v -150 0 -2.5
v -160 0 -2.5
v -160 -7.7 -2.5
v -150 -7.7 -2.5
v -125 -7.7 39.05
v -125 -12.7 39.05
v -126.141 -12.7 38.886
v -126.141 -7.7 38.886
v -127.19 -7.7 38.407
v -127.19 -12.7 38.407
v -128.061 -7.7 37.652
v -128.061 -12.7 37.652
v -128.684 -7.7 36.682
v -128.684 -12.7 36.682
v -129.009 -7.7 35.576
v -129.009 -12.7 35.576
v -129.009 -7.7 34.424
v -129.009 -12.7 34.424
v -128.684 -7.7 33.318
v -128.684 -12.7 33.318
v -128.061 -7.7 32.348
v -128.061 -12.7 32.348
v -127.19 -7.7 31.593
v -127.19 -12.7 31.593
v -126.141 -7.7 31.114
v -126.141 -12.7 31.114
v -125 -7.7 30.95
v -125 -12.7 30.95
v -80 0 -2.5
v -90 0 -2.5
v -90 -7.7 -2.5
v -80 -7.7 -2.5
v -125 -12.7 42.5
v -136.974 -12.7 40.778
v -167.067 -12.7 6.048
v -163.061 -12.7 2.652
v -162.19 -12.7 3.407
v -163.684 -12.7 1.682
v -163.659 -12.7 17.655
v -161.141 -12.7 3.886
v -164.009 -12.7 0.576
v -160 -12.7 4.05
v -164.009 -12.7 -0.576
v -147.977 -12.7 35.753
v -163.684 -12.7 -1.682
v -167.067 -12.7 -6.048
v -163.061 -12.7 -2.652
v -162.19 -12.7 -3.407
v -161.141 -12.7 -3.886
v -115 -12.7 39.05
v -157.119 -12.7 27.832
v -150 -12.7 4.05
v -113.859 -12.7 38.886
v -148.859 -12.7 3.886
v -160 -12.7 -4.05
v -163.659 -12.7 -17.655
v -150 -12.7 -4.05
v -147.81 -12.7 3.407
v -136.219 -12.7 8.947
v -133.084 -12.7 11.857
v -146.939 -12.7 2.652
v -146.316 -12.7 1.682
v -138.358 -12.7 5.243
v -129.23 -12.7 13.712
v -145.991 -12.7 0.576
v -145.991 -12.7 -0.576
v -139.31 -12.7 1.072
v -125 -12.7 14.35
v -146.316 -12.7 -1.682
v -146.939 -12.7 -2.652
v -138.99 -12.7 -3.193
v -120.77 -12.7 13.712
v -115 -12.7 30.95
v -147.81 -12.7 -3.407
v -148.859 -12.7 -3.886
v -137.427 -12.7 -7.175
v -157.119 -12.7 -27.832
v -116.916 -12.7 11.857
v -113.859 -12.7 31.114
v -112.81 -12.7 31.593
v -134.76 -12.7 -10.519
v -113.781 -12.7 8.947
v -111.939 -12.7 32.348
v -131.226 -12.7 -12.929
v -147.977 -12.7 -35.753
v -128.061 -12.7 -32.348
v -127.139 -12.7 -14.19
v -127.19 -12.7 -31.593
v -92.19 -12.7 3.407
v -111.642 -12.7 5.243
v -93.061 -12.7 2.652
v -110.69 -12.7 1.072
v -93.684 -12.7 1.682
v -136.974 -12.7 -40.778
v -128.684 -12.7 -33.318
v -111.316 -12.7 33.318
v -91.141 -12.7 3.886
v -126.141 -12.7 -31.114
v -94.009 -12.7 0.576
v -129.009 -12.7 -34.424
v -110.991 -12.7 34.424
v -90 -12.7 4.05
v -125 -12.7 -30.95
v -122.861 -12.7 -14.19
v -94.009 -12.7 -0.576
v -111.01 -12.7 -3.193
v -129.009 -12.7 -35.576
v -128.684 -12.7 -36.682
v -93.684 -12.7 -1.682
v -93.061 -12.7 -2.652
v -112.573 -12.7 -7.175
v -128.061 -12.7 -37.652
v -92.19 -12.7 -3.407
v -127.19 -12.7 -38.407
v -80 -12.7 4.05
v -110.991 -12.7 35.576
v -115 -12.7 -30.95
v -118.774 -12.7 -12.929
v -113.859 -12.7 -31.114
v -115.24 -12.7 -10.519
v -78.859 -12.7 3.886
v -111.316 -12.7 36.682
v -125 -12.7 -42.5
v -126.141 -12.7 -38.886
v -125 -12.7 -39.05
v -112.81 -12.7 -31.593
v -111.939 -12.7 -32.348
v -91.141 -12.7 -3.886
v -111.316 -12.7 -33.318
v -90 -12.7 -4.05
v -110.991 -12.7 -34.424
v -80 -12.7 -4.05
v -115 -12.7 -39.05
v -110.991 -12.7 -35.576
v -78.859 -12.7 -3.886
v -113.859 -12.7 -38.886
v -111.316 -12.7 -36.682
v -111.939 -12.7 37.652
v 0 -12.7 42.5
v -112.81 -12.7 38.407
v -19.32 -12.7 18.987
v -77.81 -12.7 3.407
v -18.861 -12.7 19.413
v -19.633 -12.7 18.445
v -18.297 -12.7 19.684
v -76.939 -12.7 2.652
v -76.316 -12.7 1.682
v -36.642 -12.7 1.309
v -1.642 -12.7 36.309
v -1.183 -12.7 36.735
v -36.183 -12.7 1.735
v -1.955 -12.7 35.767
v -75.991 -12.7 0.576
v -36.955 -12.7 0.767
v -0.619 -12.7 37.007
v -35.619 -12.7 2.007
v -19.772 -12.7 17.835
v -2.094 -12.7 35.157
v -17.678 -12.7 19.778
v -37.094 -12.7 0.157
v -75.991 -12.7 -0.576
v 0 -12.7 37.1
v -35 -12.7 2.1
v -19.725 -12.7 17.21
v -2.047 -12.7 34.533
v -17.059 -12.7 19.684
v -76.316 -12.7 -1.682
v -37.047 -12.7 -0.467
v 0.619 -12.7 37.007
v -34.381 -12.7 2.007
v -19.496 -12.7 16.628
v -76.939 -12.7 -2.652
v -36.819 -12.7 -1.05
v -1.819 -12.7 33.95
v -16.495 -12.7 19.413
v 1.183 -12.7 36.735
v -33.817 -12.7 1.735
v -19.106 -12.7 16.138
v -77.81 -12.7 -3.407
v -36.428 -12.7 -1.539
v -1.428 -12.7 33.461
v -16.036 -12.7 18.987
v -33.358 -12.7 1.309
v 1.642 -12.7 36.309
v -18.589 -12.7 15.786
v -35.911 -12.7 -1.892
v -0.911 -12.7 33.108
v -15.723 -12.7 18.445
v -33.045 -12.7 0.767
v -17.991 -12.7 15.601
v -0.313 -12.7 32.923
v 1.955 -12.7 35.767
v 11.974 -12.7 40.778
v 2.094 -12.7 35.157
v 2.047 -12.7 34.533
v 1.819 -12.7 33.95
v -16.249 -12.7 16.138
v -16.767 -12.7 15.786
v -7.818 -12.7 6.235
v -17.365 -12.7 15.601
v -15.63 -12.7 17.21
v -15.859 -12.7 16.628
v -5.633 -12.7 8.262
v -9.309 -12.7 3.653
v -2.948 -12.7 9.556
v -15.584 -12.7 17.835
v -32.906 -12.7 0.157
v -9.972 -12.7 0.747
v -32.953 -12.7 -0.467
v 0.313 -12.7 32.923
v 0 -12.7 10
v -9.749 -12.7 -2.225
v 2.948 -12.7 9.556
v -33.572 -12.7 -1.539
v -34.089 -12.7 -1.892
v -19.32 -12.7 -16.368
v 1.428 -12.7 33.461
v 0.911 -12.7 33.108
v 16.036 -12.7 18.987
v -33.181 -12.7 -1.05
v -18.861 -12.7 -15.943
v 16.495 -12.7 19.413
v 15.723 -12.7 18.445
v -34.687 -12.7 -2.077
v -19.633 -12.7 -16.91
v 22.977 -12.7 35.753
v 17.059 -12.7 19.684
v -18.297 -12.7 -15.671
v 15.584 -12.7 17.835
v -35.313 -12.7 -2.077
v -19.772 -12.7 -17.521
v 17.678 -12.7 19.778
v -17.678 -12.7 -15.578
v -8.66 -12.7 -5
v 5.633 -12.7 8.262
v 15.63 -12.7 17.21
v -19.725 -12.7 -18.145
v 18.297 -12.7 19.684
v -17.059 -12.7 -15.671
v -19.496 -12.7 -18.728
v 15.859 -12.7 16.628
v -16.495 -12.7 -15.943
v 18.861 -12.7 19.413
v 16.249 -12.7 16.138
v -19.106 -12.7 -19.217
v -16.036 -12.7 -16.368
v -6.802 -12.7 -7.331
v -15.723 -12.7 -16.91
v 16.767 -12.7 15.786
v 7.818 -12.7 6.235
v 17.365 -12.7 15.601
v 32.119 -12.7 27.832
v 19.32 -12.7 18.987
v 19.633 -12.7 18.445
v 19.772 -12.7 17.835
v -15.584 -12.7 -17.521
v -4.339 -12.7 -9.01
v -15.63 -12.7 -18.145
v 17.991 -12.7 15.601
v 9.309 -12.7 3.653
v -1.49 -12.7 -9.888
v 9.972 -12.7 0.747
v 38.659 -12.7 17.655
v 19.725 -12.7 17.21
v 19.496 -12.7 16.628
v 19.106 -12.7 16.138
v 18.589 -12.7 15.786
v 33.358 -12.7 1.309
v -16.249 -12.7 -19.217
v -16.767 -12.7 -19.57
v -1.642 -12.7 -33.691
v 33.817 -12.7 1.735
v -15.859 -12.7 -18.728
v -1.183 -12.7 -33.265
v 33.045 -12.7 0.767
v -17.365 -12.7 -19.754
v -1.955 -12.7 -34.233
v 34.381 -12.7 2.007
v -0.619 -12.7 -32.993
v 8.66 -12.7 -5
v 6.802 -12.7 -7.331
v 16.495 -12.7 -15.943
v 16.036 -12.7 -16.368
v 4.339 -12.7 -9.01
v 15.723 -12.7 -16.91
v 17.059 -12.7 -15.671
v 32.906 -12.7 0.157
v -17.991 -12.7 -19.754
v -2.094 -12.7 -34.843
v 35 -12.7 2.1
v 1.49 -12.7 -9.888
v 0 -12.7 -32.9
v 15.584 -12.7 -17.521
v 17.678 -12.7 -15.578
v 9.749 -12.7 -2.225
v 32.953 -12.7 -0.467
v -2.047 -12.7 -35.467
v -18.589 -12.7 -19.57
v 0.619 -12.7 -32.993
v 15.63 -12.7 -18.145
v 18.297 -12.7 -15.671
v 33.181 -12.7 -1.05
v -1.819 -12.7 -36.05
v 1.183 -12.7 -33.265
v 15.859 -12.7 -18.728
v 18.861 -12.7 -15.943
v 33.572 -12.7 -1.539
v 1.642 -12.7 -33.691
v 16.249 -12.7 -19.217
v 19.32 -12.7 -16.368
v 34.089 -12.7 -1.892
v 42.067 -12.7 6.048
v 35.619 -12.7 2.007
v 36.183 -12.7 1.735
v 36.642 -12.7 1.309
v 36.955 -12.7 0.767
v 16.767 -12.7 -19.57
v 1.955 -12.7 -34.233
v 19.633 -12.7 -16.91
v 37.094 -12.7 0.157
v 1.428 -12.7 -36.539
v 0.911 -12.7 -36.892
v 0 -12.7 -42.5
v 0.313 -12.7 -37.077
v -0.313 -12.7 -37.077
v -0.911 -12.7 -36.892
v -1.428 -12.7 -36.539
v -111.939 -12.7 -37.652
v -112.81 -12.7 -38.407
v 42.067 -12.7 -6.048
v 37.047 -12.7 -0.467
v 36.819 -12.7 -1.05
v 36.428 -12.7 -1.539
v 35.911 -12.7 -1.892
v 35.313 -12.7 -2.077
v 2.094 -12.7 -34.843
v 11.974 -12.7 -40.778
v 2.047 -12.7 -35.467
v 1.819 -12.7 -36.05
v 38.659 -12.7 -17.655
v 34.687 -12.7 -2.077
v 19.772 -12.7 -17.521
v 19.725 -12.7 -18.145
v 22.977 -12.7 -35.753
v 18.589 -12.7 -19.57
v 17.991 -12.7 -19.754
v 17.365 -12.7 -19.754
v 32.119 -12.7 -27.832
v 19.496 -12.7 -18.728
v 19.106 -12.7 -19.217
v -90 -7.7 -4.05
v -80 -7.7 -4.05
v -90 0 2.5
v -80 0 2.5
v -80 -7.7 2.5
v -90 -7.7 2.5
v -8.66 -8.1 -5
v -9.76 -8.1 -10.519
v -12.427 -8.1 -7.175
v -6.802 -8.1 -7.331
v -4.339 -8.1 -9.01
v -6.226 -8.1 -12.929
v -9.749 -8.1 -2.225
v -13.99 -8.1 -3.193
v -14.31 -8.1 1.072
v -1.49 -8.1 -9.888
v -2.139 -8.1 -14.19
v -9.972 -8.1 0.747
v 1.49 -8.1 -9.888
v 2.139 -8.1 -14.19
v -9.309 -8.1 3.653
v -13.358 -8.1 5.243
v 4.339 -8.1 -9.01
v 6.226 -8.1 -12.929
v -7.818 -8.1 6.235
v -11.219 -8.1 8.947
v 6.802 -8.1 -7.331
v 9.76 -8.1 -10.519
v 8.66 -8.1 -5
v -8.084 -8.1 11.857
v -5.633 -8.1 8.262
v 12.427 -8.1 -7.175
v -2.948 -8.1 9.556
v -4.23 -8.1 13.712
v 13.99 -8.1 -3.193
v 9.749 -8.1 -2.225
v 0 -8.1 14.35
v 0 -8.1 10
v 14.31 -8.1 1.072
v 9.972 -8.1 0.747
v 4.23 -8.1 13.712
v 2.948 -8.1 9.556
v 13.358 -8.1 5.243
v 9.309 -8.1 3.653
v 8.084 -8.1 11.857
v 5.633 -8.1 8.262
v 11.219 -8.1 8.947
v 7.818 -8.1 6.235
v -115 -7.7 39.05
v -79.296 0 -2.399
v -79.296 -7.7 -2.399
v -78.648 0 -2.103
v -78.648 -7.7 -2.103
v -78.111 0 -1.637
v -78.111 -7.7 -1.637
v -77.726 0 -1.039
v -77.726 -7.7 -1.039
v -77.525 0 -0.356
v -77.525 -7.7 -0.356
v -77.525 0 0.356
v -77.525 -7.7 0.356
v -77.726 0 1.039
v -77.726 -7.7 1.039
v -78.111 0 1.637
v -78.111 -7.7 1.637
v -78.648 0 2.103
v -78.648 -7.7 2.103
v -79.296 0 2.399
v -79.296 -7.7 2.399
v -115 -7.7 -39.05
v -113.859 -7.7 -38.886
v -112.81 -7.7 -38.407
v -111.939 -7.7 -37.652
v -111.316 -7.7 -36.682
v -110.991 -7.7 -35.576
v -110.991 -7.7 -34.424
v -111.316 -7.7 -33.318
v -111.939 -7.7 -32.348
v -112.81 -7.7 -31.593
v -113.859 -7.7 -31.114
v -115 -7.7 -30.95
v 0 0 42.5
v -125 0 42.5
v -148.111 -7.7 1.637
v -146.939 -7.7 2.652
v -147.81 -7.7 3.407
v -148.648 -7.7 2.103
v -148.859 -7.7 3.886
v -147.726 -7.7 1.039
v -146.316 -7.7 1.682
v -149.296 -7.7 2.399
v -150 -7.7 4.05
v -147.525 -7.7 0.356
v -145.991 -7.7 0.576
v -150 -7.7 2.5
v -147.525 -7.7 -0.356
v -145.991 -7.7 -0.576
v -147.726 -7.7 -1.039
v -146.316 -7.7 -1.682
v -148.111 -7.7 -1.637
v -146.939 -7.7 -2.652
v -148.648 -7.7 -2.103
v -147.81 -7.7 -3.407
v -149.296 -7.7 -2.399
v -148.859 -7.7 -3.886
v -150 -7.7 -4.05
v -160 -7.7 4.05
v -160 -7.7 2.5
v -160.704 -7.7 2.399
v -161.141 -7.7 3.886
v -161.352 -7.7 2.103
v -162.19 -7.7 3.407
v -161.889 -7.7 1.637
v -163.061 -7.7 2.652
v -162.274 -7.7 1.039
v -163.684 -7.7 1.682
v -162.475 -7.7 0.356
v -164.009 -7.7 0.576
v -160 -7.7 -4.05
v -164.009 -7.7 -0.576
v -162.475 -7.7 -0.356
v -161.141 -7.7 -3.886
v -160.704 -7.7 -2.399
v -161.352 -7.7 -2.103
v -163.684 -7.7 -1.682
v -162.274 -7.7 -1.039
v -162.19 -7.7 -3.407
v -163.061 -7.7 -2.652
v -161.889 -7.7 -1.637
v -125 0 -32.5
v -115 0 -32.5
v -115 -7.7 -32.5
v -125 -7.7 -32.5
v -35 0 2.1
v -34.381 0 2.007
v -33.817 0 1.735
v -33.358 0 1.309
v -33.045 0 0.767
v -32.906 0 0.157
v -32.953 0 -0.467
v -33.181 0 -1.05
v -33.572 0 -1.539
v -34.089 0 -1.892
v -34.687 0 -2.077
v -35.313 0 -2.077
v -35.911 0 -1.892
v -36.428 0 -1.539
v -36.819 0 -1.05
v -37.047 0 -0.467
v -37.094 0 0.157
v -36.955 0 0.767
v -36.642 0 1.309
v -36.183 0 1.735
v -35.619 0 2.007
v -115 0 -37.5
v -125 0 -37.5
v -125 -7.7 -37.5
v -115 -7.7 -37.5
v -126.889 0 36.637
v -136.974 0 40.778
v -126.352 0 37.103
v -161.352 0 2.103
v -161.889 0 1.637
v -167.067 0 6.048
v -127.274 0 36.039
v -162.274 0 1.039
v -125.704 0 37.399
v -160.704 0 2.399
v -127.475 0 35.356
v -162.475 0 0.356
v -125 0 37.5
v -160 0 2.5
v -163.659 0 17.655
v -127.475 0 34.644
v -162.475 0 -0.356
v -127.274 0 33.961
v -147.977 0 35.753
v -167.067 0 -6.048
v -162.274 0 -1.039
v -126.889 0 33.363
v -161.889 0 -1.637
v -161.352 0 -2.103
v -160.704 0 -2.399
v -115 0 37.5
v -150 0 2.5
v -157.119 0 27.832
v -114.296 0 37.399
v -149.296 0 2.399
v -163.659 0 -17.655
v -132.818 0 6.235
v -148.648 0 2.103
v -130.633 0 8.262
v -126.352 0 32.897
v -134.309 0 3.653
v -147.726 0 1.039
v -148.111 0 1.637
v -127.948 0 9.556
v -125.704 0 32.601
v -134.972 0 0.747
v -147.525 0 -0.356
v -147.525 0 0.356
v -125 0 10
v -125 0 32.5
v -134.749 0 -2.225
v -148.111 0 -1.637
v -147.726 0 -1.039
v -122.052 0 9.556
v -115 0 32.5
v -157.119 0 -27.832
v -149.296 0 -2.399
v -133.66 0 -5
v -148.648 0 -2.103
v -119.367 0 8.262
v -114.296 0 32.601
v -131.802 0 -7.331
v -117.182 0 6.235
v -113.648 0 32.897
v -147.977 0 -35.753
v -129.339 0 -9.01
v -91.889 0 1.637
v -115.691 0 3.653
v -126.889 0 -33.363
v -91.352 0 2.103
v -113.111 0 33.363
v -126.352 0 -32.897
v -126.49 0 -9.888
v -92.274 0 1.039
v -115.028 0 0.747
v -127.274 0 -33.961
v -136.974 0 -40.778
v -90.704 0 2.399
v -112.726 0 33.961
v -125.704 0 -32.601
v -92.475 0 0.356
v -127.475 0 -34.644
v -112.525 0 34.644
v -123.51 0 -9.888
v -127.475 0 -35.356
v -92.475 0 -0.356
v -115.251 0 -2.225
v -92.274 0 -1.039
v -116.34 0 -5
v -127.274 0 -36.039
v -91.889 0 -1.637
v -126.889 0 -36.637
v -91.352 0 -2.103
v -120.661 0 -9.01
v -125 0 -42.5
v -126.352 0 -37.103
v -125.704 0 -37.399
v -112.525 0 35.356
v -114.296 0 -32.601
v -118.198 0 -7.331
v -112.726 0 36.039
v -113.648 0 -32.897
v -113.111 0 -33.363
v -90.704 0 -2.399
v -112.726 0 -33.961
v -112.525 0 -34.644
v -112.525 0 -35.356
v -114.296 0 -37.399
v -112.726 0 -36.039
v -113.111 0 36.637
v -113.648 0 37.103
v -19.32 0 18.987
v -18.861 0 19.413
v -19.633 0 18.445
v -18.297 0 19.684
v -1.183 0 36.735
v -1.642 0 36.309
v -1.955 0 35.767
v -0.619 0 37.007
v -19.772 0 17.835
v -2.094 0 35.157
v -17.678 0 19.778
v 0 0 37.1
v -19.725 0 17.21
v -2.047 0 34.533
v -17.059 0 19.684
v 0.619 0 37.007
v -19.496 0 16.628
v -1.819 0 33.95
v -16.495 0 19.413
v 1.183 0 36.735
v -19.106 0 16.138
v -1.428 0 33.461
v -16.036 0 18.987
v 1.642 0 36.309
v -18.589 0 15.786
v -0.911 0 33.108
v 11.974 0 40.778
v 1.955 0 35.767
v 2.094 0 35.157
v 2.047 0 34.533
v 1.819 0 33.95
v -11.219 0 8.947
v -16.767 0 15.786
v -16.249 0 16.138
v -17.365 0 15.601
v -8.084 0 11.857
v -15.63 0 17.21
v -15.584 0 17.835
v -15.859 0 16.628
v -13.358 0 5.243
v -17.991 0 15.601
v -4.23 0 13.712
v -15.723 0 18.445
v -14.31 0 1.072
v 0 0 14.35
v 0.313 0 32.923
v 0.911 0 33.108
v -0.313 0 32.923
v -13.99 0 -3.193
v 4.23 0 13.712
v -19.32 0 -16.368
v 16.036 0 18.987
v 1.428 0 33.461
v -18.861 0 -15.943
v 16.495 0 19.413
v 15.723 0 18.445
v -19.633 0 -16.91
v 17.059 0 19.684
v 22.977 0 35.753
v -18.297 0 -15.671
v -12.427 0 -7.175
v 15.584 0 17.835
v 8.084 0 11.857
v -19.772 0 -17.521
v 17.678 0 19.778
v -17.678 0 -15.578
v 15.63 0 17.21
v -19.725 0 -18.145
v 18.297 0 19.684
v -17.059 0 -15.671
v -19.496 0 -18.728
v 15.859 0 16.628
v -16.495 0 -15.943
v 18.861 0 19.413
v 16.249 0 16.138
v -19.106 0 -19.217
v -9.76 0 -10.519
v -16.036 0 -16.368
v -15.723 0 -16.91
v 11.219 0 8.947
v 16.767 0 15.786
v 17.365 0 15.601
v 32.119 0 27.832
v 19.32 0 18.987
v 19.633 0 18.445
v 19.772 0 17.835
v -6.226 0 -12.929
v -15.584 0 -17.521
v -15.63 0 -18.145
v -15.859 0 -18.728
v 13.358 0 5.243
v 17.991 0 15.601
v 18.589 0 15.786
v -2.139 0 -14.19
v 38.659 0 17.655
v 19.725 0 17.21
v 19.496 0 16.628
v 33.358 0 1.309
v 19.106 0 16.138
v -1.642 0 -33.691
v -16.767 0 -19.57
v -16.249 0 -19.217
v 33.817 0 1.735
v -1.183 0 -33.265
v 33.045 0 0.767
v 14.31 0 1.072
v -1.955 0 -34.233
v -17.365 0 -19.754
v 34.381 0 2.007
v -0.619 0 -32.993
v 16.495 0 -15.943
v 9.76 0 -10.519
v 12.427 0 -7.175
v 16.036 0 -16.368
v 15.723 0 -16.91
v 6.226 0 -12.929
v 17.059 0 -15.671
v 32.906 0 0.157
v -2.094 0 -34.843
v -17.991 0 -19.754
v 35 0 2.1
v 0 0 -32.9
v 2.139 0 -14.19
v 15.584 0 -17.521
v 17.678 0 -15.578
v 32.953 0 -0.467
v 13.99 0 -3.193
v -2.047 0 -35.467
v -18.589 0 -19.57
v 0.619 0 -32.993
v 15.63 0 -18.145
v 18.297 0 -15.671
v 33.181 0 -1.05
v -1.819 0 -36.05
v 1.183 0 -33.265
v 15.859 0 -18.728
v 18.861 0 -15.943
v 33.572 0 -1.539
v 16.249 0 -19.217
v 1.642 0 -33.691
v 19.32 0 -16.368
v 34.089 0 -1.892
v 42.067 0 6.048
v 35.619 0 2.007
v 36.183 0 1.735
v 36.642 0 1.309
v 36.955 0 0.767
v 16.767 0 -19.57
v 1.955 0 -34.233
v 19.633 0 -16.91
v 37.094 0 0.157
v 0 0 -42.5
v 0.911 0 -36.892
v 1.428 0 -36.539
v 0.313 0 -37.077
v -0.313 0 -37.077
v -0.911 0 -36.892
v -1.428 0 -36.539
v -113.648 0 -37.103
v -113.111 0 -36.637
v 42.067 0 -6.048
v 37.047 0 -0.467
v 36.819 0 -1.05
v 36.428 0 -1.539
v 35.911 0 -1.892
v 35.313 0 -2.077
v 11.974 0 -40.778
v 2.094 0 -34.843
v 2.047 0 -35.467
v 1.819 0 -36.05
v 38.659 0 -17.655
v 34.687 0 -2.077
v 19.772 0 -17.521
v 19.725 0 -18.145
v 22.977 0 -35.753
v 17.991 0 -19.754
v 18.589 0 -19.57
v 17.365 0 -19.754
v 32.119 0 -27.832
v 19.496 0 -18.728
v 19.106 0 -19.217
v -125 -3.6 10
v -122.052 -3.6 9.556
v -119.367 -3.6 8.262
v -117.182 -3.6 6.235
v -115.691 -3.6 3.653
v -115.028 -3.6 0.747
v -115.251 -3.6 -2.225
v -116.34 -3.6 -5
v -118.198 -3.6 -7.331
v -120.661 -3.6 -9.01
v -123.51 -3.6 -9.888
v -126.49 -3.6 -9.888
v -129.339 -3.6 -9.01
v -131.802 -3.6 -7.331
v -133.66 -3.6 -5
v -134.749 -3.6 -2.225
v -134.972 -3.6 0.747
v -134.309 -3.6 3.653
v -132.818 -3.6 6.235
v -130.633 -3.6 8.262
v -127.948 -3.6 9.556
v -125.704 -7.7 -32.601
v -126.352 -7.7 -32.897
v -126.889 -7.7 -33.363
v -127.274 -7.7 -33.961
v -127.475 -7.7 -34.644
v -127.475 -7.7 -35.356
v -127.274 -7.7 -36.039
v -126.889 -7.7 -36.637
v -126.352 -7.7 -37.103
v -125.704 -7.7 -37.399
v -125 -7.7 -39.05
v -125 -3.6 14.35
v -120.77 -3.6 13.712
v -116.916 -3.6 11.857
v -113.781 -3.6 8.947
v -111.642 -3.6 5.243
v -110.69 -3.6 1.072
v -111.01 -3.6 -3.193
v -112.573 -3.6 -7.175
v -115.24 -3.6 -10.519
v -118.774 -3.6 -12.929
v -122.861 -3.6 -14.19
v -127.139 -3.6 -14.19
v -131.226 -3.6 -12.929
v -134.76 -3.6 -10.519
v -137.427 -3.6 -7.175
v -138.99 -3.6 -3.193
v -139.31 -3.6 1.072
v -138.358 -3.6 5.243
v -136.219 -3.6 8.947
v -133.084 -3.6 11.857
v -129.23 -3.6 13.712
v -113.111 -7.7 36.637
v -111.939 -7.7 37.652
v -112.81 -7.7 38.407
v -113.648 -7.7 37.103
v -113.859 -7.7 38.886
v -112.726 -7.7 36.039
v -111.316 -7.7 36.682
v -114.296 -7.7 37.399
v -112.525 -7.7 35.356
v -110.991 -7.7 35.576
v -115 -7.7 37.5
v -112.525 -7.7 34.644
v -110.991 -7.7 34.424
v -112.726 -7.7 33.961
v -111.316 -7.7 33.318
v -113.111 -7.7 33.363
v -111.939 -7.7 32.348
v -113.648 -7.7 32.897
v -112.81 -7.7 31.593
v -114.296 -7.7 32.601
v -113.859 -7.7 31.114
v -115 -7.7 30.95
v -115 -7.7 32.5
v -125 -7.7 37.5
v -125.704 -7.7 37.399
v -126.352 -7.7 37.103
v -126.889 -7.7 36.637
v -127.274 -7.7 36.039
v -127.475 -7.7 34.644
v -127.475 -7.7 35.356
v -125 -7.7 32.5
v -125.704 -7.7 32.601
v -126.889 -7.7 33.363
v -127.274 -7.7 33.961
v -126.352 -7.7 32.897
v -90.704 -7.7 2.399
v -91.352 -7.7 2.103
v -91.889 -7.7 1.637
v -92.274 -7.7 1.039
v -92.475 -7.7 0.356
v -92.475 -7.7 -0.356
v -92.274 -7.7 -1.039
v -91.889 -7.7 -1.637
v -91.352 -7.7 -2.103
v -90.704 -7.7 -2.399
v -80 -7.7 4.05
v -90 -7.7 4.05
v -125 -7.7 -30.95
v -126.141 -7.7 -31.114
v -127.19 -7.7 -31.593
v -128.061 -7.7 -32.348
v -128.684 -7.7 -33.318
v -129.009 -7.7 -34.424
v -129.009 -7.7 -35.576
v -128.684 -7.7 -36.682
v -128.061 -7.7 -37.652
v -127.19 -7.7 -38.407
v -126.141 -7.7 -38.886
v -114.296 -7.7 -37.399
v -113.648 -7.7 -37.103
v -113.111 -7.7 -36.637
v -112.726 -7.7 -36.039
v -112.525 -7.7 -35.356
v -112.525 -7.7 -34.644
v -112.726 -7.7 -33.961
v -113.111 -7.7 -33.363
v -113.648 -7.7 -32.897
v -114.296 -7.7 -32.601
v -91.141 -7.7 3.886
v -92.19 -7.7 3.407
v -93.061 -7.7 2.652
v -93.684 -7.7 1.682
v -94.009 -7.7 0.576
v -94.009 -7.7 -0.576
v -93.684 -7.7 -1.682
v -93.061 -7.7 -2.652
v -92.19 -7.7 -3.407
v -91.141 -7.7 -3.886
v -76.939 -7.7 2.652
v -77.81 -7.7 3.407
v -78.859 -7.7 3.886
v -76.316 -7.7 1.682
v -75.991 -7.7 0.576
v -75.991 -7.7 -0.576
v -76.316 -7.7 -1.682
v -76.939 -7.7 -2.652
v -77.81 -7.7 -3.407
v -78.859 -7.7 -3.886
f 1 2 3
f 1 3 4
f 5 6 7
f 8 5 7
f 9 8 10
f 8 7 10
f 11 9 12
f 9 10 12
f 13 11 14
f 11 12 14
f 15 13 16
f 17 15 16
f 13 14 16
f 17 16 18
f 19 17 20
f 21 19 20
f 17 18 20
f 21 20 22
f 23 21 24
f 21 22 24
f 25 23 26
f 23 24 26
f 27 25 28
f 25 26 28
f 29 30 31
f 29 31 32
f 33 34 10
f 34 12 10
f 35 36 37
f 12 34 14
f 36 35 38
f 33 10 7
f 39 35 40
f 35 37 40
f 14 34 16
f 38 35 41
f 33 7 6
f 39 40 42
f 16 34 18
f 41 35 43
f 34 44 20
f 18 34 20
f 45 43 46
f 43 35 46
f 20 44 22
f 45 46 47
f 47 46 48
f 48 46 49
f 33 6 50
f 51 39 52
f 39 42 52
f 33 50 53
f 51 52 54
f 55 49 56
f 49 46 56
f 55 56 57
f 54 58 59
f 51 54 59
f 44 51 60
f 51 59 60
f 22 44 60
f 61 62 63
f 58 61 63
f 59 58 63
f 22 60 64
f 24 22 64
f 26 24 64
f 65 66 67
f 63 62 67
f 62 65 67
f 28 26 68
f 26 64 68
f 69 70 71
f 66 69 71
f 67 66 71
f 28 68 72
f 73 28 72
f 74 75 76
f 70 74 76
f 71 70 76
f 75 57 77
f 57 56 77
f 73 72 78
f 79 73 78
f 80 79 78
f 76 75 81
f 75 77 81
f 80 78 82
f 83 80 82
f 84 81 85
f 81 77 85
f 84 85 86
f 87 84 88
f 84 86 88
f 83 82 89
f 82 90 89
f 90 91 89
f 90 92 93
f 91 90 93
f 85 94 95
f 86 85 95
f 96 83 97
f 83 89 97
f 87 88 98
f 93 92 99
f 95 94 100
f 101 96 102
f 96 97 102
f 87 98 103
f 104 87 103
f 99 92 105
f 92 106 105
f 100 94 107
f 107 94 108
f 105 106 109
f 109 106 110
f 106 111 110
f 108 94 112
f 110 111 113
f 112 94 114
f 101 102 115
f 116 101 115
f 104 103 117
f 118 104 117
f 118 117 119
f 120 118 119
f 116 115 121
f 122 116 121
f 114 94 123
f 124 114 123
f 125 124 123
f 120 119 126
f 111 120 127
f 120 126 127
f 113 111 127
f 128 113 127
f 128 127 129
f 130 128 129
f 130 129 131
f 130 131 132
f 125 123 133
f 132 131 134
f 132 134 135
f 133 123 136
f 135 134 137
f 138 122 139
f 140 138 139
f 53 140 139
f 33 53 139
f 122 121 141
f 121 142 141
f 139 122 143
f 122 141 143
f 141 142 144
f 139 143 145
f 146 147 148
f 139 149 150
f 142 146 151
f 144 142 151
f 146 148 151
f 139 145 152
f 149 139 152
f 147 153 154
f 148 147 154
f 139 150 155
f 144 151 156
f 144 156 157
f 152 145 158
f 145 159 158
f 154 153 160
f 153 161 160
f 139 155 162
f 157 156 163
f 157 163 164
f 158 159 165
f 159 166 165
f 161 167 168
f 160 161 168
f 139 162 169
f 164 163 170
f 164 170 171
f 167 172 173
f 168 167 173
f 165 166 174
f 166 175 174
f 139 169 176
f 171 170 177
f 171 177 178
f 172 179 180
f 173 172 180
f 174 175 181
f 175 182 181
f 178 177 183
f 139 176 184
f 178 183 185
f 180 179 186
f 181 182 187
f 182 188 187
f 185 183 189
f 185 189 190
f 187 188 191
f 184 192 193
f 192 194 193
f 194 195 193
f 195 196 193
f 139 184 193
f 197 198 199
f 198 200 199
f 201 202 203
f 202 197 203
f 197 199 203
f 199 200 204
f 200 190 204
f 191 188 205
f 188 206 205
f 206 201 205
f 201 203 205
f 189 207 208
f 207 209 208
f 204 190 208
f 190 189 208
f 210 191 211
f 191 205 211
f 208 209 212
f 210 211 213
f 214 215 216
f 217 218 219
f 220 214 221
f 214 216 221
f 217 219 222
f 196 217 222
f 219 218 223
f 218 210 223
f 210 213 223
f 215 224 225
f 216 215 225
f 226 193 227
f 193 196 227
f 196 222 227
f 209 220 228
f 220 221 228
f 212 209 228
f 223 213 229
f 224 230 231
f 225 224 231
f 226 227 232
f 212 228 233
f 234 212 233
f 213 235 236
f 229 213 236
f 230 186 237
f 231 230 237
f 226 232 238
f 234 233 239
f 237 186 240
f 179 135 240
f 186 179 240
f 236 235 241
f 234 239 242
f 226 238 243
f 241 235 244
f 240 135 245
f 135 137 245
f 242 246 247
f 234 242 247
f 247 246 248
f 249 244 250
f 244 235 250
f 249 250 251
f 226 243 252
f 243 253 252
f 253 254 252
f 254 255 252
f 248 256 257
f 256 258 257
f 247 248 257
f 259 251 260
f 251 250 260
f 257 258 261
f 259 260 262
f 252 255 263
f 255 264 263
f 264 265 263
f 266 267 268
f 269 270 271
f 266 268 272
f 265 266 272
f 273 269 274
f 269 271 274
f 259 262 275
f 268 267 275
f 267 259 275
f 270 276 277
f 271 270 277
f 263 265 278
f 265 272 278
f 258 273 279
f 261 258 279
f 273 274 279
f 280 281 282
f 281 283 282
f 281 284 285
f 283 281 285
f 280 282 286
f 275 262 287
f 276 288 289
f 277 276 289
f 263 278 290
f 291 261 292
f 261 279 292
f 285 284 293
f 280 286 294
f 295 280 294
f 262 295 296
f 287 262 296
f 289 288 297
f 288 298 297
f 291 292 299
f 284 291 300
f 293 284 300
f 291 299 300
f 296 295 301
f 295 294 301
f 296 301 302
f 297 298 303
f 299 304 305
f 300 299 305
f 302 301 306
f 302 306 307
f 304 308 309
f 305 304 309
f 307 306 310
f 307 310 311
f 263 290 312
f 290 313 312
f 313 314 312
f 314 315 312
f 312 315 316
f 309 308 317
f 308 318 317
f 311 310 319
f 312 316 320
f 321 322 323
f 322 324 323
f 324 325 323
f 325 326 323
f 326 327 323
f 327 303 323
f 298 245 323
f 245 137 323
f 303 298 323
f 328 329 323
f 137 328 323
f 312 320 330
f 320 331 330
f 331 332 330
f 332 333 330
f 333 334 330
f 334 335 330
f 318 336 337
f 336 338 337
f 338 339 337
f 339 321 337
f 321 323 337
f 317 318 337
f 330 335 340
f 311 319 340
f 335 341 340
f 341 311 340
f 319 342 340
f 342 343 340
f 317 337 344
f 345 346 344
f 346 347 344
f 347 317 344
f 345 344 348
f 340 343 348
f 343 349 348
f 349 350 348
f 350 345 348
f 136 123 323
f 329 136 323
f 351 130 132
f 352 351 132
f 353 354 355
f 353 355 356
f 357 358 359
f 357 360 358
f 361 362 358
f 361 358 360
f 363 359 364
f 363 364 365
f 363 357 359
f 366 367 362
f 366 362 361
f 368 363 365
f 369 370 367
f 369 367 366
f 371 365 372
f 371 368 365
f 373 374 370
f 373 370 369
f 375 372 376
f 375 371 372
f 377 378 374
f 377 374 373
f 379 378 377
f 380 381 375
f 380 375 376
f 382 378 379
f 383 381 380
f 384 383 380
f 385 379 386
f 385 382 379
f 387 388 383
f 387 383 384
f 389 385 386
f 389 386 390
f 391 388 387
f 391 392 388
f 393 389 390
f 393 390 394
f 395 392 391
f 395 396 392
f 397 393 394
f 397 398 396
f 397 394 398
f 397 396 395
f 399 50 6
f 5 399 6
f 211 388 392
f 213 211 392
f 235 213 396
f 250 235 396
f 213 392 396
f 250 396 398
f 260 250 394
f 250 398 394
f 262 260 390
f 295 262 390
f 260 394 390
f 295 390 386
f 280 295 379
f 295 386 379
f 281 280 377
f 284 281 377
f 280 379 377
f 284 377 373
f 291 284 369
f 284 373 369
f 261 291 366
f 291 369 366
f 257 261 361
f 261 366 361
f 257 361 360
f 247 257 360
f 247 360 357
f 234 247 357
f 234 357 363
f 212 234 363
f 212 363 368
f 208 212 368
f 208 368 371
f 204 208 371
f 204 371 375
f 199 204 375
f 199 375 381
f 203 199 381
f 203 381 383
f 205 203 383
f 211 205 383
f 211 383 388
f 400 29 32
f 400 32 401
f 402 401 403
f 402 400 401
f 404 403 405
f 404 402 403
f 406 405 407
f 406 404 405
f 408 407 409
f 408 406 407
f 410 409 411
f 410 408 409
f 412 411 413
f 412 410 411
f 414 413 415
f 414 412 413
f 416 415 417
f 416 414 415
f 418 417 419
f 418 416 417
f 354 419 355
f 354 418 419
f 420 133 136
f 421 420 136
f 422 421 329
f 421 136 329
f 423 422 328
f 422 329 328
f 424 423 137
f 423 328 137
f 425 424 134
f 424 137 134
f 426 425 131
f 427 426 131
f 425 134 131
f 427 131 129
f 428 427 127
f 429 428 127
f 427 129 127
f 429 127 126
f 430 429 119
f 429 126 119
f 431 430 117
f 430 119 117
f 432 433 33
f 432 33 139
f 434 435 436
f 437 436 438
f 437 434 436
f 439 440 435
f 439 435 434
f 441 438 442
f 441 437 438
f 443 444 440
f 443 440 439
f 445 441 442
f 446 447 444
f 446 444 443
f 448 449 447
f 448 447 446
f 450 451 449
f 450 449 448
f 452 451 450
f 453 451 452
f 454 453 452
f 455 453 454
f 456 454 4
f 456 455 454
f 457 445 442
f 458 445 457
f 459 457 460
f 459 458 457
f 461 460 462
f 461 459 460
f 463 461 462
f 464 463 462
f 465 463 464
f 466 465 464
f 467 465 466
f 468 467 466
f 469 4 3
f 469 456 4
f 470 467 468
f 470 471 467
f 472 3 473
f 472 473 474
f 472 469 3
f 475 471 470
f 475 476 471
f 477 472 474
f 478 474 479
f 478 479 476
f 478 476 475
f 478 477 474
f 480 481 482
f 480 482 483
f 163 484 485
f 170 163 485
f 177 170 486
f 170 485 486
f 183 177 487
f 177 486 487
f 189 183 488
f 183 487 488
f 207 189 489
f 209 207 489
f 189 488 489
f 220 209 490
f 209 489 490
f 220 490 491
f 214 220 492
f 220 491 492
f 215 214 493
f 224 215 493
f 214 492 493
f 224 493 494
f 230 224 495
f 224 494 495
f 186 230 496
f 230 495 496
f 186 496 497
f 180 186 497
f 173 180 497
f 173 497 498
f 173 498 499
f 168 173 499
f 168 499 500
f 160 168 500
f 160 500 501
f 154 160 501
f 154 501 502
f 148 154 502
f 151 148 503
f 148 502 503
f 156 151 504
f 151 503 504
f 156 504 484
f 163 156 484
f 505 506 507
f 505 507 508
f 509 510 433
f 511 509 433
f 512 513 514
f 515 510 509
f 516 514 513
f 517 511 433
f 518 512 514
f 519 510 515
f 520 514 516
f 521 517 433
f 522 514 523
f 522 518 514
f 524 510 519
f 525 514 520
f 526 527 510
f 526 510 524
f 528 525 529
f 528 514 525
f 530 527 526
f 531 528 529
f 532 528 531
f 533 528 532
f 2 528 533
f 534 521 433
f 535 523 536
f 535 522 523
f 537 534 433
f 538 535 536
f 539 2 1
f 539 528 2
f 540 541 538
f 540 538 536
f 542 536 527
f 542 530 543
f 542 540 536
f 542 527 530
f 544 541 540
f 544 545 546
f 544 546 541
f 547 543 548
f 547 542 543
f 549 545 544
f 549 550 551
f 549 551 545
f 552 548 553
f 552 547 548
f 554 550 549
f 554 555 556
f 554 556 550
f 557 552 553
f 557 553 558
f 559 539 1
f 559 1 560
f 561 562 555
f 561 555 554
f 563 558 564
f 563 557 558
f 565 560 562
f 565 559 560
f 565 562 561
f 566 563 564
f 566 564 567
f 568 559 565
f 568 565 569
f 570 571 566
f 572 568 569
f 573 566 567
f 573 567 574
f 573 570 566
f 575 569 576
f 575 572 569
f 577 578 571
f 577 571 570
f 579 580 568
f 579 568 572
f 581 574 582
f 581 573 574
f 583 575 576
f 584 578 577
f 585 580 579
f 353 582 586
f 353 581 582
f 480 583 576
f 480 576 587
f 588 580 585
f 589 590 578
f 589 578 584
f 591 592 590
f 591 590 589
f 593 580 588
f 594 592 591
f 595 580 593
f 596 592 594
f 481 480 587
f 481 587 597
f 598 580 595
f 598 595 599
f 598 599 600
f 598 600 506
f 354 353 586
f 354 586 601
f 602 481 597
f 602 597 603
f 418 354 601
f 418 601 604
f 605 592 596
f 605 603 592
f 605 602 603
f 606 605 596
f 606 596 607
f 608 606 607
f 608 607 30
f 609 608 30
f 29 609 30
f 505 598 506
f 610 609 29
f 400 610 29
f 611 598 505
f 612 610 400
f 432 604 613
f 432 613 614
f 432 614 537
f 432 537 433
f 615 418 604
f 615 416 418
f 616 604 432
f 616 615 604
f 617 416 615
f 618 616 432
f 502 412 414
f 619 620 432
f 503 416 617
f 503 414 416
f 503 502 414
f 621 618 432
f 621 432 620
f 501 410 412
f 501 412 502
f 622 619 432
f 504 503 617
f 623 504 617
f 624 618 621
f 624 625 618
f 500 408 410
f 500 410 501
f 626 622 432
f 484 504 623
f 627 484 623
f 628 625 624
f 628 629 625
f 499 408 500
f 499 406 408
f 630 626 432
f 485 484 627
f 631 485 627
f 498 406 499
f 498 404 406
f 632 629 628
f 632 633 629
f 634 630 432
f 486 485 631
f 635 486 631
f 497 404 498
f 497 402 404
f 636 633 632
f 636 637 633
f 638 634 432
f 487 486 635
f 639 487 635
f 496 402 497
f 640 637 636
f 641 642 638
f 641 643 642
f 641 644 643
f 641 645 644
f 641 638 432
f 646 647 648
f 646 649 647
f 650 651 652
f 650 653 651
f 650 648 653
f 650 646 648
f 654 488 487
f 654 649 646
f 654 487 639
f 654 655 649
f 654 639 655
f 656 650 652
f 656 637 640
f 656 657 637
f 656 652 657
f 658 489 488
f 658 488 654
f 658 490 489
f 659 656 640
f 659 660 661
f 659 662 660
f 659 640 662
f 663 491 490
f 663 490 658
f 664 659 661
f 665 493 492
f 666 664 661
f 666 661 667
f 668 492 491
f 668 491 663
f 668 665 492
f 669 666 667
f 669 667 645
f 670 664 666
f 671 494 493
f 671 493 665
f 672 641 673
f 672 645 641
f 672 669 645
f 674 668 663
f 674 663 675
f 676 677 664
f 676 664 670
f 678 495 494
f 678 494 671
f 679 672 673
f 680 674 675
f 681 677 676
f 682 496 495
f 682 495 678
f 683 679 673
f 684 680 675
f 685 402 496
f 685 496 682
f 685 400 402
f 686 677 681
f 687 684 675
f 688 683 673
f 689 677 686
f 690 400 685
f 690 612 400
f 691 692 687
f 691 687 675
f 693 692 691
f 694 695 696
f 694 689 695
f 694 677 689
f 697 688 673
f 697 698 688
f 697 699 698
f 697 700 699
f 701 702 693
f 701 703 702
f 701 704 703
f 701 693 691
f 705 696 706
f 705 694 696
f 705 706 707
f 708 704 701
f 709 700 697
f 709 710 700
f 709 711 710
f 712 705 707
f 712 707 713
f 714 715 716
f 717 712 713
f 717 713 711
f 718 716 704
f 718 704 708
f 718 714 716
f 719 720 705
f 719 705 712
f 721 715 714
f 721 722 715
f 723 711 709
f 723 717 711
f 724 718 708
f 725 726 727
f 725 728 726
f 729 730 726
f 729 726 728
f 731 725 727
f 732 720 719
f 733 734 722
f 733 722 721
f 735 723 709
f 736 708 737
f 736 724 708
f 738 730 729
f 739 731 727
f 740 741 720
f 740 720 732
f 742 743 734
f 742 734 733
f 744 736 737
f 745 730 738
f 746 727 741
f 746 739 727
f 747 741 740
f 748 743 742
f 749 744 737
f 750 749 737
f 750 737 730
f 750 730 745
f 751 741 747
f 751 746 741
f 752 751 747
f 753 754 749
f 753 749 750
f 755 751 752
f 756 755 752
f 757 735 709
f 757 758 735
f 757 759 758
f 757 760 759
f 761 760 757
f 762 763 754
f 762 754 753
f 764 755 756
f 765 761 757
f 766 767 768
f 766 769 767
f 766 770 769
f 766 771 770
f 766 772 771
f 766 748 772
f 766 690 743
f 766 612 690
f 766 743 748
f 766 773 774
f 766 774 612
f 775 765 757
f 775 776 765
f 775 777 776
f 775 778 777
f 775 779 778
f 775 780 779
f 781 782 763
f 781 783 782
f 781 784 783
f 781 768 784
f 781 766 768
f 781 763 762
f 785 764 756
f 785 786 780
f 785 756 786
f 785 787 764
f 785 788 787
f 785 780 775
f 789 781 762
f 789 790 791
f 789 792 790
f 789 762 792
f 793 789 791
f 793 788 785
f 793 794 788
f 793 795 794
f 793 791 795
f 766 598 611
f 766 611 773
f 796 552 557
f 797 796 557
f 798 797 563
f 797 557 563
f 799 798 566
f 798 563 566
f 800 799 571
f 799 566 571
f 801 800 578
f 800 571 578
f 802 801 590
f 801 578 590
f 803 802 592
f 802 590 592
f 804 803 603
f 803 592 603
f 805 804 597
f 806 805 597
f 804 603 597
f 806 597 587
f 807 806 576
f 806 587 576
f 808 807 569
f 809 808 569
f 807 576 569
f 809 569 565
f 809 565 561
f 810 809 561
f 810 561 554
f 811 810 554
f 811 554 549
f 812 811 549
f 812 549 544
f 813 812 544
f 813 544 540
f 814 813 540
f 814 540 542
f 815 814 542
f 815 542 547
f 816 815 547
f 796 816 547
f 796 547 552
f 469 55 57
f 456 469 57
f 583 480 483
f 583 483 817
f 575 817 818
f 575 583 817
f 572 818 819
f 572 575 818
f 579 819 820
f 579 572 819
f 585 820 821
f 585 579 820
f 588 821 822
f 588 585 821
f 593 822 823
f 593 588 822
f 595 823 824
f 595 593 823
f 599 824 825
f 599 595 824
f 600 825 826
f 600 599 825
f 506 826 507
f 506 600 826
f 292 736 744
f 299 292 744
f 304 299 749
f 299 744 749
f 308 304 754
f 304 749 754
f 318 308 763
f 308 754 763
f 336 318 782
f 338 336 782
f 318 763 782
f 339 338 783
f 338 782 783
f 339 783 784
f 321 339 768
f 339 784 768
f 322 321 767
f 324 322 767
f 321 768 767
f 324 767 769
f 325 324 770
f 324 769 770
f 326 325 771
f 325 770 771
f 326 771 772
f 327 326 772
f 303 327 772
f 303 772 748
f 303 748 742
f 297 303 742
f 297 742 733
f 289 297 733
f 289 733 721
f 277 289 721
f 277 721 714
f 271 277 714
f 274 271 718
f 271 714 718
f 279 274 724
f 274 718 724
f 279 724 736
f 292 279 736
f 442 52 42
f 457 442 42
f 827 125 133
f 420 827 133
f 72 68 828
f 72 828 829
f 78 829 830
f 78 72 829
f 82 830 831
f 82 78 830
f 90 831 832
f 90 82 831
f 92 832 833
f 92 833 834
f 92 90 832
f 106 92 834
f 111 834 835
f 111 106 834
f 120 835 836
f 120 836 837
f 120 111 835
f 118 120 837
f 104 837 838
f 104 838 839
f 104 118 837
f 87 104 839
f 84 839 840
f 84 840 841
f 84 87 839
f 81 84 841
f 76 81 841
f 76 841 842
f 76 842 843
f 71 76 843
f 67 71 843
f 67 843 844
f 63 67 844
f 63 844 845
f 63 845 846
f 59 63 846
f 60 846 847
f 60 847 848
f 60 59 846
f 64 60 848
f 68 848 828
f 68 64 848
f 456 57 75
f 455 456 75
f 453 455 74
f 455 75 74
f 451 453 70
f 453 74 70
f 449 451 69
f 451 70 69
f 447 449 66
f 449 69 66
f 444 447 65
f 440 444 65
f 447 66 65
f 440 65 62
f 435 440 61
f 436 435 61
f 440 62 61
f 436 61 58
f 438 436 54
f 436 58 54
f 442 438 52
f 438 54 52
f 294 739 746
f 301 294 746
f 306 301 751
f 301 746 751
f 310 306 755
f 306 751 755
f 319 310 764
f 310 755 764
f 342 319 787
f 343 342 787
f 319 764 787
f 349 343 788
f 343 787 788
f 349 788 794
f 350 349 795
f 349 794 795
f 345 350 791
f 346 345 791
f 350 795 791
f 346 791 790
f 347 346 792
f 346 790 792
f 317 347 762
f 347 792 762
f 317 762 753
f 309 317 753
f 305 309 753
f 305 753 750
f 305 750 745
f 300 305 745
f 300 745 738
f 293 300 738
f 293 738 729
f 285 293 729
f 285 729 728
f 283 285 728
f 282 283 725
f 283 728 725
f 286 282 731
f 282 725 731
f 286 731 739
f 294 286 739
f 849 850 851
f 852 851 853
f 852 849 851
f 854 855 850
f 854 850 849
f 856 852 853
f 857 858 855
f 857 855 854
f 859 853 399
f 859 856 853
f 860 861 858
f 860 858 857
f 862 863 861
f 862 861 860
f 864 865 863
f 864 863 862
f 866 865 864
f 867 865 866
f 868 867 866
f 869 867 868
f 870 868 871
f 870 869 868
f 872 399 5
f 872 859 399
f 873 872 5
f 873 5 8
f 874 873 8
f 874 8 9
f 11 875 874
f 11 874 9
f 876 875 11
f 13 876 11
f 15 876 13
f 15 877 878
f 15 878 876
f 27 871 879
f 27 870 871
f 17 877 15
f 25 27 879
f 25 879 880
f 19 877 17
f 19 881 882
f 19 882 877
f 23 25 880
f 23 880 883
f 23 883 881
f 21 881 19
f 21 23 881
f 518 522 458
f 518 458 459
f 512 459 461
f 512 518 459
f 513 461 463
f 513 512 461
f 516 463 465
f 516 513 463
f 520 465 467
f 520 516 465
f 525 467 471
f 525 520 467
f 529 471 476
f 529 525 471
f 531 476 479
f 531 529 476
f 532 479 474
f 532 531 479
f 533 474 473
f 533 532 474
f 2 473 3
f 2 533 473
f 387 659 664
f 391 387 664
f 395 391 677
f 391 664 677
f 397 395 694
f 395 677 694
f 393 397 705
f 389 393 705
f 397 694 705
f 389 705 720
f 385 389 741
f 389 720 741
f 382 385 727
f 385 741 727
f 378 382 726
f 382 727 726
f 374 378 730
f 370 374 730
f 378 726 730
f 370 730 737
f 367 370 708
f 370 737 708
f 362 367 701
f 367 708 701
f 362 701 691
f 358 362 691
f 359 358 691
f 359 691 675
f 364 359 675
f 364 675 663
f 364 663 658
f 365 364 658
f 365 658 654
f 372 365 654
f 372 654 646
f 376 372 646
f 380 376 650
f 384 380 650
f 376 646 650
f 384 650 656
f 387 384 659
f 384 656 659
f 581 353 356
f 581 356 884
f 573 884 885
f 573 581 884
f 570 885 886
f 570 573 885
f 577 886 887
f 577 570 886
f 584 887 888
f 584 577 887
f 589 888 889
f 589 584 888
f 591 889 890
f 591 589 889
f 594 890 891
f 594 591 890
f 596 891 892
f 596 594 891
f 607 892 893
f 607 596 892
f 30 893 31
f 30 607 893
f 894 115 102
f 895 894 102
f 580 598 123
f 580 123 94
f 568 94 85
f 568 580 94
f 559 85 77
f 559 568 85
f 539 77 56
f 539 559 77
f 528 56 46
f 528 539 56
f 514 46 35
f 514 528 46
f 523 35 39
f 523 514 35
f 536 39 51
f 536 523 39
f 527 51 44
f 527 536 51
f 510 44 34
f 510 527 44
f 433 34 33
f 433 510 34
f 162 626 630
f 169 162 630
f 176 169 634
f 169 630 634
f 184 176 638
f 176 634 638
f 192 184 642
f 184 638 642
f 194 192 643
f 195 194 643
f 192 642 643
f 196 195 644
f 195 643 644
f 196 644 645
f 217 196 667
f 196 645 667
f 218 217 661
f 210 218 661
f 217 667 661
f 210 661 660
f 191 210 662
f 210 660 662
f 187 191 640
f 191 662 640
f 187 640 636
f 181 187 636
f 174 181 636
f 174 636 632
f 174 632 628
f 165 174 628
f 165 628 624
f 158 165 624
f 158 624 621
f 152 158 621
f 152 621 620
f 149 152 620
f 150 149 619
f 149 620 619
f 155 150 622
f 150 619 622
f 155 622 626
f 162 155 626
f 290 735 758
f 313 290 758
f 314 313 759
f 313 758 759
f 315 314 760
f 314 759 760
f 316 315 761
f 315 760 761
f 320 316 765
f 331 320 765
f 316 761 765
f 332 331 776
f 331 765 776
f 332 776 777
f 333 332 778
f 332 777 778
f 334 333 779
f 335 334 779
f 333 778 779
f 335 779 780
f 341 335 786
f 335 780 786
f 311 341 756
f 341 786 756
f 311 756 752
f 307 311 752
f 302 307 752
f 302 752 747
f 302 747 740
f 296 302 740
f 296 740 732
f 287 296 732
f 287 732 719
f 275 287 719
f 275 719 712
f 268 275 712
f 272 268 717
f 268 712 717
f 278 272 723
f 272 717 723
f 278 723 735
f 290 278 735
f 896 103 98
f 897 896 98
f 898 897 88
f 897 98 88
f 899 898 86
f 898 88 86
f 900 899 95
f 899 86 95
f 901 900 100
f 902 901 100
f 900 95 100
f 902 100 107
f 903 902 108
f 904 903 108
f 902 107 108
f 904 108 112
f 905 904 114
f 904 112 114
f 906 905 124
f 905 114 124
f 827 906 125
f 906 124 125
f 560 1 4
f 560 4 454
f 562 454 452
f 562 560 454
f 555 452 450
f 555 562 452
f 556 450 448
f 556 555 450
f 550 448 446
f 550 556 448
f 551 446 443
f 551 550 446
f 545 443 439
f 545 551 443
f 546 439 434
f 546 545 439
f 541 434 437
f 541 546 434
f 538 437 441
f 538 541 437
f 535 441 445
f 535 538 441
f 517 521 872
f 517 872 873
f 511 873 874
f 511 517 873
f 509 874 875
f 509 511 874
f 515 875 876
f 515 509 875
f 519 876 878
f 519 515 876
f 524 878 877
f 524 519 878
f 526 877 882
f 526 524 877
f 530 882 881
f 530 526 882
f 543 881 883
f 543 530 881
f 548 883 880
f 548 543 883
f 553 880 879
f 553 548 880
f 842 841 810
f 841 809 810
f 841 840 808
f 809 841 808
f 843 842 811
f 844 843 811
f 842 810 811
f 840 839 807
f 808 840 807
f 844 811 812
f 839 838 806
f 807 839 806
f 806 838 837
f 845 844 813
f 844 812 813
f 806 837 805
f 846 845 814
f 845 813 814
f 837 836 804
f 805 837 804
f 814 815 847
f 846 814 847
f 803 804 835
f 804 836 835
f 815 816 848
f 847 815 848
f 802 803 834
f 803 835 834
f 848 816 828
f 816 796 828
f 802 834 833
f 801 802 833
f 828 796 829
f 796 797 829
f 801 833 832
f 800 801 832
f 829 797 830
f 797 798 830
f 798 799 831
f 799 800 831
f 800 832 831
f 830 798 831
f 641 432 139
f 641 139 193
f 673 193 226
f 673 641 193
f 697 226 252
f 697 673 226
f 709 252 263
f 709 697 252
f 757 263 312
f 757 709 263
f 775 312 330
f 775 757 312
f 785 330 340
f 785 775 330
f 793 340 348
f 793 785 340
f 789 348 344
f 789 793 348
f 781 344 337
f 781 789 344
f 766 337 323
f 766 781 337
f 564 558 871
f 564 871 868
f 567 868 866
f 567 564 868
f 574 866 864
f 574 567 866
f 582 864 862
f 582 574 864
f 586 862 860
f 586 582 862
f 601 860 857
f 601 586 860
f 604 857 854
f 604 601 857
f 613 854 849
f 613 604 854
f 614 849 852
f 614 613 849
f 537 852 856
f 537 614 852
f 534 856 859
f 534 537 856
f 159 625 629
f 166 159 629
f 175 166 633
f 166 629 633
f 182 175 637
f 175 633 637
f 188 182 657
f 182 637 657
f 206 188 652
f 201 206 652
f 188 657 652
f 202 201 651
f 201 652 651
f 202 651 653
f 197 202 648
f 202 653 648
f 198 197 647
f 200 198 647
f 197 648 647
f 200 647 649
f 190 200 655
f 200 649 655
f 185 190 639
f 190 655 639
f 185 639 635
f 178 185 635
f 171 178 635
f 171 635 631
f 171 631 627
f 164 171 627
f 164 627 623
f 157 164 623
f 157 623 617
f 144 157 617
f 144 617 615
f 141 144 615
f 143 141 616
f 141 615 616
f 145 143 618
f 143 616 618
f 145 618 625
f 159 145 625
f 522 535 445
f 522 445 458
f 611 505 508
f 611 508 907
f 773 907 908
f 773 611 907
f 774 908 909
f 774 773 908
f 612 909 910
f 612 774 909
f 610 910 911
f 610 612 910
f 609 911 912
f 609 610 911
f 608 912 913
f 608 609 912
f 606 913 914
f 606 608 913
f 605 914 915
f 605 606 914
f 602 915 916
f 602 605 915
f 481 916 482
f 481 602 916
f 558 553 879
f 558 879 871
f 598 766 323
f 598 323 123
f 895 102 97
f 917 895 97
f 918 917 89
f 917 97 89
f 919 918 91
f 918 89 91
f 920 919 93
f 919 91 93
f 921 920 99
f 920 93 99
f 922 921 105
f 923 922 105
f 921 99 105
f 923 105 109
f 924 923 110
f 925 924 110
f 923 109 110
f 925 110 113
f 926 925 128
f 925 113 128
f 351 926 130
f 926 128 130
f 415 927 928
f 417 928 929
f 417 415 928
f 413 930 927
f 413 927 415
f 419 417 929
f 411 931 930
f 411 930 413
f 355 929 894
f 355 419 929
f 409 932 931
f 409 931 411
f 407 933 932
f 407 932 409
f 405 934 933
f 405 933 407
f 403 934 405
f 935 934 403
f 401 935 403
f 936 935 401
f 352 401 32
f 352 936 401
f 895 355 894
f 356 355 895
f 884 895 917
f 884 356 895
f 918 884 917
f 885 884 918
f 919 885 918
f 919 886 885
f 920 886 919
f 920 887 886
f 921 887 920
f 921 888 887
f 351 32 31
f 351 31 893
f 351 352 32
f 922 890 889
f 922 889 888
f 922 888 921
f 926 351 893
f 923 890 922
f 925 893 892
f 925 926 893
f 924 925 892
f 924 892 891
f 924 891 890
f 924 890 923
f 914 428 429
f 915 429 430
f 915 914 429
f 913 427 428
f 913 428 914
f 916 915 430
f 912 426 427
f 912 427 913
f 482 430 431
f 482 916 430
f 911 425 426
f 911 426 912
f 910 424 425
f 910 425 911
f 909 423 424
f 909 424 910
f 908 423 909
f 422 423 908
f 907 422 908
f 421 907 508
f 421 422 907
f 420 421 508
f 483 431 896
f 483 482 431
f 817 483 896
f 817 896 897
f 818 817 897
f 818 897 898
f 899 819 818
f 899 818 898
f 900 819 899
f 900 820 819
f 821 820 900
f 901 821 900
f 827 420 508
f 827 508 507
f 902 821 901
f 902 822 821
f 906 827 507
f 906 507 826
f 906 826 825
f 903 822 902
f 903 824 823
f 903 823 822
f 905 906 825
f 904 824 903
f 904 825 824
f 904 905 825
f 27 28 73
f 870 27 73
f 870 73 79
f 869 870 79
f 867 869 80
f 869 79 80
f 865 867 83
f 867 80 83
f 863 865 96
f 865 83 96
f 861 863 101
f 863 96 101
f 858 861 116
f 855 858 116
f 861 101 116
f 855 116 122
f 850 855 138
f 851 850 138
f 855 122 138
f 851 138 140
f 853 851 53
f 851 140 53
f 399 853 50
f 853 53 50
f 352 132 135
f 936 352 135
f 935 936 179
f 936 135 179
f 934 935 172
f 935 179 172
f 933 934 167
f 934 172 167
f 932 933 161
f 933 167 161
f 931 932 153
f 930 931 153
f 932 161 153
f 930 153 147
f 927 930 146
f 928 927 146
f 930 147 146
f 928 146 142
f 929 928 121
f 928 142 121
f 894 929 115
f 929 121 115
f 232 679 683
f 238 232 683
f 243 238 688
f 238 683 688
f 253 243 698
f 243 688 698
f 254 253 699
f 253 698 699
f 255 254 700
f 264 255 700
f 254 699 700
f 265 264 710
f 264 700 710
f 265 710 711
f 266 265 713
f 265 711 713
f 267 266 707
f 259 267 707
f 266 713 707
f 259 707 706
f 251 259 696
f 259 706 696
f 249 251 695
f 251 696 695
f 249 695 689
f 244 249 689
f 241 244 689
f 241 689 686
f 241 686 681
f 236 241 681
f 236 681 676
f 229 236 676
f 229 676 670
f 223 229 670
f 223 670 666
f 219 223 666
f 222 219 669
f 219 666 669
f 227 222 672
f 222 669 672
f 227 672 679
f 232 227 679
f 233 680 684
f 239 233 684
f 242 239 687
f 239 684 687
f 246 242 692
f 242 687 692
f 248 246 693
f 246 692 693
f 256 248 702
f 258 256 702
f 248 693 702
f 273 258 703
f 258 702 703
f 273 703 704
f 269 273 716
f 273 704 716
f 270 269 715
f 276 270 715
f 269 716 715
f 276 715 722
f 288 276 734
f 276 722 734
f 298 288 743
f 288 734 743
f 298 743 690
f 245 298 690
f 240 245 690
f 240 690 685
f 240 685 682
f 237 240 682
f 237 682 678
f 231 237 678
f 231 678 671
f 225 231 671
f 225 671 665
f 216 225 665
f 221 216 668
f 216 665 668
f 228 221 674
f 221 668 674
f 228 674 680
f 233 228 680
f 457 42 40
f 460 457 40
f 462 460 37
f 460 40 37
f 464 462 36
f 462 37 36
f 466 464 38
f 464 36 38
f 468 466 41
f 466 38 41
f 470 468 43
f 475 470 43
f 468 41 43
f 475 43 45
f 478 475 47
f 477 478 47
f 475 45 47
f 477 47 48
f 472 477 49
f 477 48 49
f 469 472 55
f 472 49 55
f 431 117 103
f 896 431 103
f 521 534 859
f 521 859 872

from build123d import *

# Parameters (mm, degrees)
SKETCH1_R           = 10
SKETCH1_R_2         = 2.1
BOSS_EXTRUDE1_DEPTH = 12.7
SKETCH2_R           = 14.35
CUT_EXTRUDE1_DEPTH  = 8.1
CUT_EXTRUDE2_START  = -12.7
SKETCH3_R           = 14.35
CUT_EXTRUDE2_DEPTH  = 9.1
CUT_EXTRUDE3_START  = -12.7
CUT_EXTRUDE3_DEPTH  = 5


with BuildPart() as part:
    # Sketch1 → Boss-Extrude1 (new body)
    with BuildSketch(Plane(origin=(0, 0, 0), x_dir=(1, 0, 0), z_dir=(0, 1, 0))):
        with BuildLine():
            ThreePointArc((-125, 42.5), (-167.5, 0), (-125, -42.5))
            Line((-125, -42.5), (0, -42.5))
            ThreePointArc((0, -42.5), (42.5, 0), (0, 42.5))
            Line((0, 42.5), (-125, 42.5))
        make_face()
        with BuildLine():
            Line((-90, 2.5), (-80, 2.5))
            ThreePointArc((-80, 2.5), (-77.5, 0), (-80, -2.5))
            Line((-80, -2.5), (-90, -2.5))
            ThreePointArc((-90, -2.5), (-92.5, 0), (-90, 2.5))
        make_face(mode=Mode.SUBTRACT)
        with BuildLine():
            ThreePointArc((-125, -37.5), (-127.5, -35), (-125, -32.5))
            Line((-125, -32.5), (-115, -32.5))
            ThreePointArc((-115, -32.5), (-112.5, -35), (-115, -37.5))
            Line((-115, -37.5), (-125, -37.5))
        make_face(mode=Mode.SUBTRACT)
        with BuildLine():
            ThreePointArc((-160, -2.5), (-162.5, 0), (-160, 2.5))
            Line((-160, 2.5), (-150, 2.5))
            ThreePointArc((-150, 2.5), (-147.5, 0), (-150, -2.5))
            Line((-150, -2.5), (-160, -2.5))
        make_face(mode=Mode.SUBTRACT)
        with Locations(Location((-125, 0, 0), (0, 0, 270))):
            Circle(SKETCH1_R, mode=Mode.SUBTRACT)
        with BuildLine():
            ThreePointArc((-125, 32.5), (-127.5, 35), (-125, 37.5))
            Line((-125, 37.5), (-115, 37.5))
            ThreePointArc((-115, 37.5), (-112.5, 35), (-115, 32.5))
            Line((-115, 32.5), (-125, 32.5))
        make_face(mode=Mode.SUBTRACT)
        with Locations(Location((0, 35, 0), (0, 0, 270))):
            Circle(SKETCH1_R_2, mode=Mode.SUBTRACT)
        with Locations(Location((0, -35, 0), (0, 0, 270))):
            Circle(SKETCH1_R_2, mode=Mode.SUBTRACT)
        with Locations(Location((-17.67766953, -17.67766953, 0), (0, 0, 270))):
            Circle(SKETCH1_R_2, mode=Mode.SUBTRACT)
        with Locations(Location((17.67766953, -17.67766953, 0), (0, 0, 270))):
            Circle(SKETCH1_R_2, mode=Mode.SUBTRACT)
        with Locations(Location((-35, 0, 0), (0, 0, 270))):
            Circle(SKETCH1_R_2, mode=Mode.SUBTRACT)
        with Locations(Location((-17.67766953, 17.67766953, 0), (0, 0, 270))):
            Circle(SKETCH1_R_2, mode=Mode.SUBTRACT)
        with Locations(Location((0, 0, 0), (0, 0, 270))):
            Circle(SKETCH1_R, mode=Mode.SUBTRACT)
        with Locations(Location((35, 0, 0), (0, 0, 270))):
            Circle(SKETCH1_R_2, mode=Mode.SUBTRACT)
        with Locations(Location((17.67766953, 17.67766953, 0), (0, 0, 270))):
            Circle(SKETCH1_R_2, mode=Mode.SUBTRACT)
    extrude(amount=-BOSS_EXTRUDE1_DEPTH)

    # Sketch2 → Cut-Extrude1 (cut)
    with BuildSketch(Plane(origin=(0, 0, 0), x_dir=(1, 0, 0), z_dir=(0, 1, 0))):
        with Locations(Location((0, 0, 0), (0, 0, 270))):
            Circle(SKETCH2_R)
    extrude(amount=-CUT_EXTRUDE1_DEPTH, mode=Mode.SUBTRACT)

    # Sketch3 → Cut-Extrude2 (cut)
    with BuildSketch(Plane(origin=(0, 0, 0), x_dir=(1, 0, 0), z_dir=(0, 1, 0)).offset(CUT_EXTRUDE2_START)):
        with Locations(Location((-125, 0, 0), (0, 0, 270))):
            Circle(SKETCH3_R)
    extrude(amount=CUT_EXTRUDE2_DEPTH, mode=Mode.SUBTRACT)

    # Sketch4 → Cut-Extrude3 (cut)
    with BuildSketch(Plane(origin=(0, 0, 0), x_dir=(1, 0, 0), z_dir=(0, 1, 0)).offset(CUT_EXTRUDE3_START)):
        with BuildLine():
            Line((-150, -4.05), (-160, -4.05))
            ThreePointArc((-160, -4.05), (-164.05, 0), (-160, 4.05))
            Line((-160, 4.05), (-150, 4.05))
            ThreePointArc((-150, 4.05), (-145.95, 0), (-150, -4.05))
        make_face()
        with BuildLine():
            Line((-125, -30.95), (-115, -30.95))
            ThreePointArc((-115, -30.95), (-110.95, -35), (-115, -39.05))
            Line((-115, -39.05), (-125, -39.05))
            ThreePointArc((-125, -39.05), (-129.05, -35), (-125, -30.95))
        make_face()
        with BuildLine():
            Line((-80, -4.05), (-90, -4.05))
            ThreePointArc((-90, -4.05), (-94.05, 0), (-90, 4.05))
            Line((-90, 4.05), (-80, 4.05))
            ThreePointArc((-80, 4.05), (-75.95, 0), (-80, -4.05))
        make_face()
        with BuildLine():
            Line((-125, 39.05), (-115, 39.05))
            ThreePointArc((-115, 39.05), (-110.95, 35), (-115, 30.95))
            Line((-115, 30.95), (-125, 30.95))
            ThreePointArc((-125, 30.95), (-129.05, 35), (-125, 39.05))
        make_face()
    extrude(amount=CUT_EXTRUDE3_DEPTH, mode=Mode.SUBTRACT)


solid = part.part
